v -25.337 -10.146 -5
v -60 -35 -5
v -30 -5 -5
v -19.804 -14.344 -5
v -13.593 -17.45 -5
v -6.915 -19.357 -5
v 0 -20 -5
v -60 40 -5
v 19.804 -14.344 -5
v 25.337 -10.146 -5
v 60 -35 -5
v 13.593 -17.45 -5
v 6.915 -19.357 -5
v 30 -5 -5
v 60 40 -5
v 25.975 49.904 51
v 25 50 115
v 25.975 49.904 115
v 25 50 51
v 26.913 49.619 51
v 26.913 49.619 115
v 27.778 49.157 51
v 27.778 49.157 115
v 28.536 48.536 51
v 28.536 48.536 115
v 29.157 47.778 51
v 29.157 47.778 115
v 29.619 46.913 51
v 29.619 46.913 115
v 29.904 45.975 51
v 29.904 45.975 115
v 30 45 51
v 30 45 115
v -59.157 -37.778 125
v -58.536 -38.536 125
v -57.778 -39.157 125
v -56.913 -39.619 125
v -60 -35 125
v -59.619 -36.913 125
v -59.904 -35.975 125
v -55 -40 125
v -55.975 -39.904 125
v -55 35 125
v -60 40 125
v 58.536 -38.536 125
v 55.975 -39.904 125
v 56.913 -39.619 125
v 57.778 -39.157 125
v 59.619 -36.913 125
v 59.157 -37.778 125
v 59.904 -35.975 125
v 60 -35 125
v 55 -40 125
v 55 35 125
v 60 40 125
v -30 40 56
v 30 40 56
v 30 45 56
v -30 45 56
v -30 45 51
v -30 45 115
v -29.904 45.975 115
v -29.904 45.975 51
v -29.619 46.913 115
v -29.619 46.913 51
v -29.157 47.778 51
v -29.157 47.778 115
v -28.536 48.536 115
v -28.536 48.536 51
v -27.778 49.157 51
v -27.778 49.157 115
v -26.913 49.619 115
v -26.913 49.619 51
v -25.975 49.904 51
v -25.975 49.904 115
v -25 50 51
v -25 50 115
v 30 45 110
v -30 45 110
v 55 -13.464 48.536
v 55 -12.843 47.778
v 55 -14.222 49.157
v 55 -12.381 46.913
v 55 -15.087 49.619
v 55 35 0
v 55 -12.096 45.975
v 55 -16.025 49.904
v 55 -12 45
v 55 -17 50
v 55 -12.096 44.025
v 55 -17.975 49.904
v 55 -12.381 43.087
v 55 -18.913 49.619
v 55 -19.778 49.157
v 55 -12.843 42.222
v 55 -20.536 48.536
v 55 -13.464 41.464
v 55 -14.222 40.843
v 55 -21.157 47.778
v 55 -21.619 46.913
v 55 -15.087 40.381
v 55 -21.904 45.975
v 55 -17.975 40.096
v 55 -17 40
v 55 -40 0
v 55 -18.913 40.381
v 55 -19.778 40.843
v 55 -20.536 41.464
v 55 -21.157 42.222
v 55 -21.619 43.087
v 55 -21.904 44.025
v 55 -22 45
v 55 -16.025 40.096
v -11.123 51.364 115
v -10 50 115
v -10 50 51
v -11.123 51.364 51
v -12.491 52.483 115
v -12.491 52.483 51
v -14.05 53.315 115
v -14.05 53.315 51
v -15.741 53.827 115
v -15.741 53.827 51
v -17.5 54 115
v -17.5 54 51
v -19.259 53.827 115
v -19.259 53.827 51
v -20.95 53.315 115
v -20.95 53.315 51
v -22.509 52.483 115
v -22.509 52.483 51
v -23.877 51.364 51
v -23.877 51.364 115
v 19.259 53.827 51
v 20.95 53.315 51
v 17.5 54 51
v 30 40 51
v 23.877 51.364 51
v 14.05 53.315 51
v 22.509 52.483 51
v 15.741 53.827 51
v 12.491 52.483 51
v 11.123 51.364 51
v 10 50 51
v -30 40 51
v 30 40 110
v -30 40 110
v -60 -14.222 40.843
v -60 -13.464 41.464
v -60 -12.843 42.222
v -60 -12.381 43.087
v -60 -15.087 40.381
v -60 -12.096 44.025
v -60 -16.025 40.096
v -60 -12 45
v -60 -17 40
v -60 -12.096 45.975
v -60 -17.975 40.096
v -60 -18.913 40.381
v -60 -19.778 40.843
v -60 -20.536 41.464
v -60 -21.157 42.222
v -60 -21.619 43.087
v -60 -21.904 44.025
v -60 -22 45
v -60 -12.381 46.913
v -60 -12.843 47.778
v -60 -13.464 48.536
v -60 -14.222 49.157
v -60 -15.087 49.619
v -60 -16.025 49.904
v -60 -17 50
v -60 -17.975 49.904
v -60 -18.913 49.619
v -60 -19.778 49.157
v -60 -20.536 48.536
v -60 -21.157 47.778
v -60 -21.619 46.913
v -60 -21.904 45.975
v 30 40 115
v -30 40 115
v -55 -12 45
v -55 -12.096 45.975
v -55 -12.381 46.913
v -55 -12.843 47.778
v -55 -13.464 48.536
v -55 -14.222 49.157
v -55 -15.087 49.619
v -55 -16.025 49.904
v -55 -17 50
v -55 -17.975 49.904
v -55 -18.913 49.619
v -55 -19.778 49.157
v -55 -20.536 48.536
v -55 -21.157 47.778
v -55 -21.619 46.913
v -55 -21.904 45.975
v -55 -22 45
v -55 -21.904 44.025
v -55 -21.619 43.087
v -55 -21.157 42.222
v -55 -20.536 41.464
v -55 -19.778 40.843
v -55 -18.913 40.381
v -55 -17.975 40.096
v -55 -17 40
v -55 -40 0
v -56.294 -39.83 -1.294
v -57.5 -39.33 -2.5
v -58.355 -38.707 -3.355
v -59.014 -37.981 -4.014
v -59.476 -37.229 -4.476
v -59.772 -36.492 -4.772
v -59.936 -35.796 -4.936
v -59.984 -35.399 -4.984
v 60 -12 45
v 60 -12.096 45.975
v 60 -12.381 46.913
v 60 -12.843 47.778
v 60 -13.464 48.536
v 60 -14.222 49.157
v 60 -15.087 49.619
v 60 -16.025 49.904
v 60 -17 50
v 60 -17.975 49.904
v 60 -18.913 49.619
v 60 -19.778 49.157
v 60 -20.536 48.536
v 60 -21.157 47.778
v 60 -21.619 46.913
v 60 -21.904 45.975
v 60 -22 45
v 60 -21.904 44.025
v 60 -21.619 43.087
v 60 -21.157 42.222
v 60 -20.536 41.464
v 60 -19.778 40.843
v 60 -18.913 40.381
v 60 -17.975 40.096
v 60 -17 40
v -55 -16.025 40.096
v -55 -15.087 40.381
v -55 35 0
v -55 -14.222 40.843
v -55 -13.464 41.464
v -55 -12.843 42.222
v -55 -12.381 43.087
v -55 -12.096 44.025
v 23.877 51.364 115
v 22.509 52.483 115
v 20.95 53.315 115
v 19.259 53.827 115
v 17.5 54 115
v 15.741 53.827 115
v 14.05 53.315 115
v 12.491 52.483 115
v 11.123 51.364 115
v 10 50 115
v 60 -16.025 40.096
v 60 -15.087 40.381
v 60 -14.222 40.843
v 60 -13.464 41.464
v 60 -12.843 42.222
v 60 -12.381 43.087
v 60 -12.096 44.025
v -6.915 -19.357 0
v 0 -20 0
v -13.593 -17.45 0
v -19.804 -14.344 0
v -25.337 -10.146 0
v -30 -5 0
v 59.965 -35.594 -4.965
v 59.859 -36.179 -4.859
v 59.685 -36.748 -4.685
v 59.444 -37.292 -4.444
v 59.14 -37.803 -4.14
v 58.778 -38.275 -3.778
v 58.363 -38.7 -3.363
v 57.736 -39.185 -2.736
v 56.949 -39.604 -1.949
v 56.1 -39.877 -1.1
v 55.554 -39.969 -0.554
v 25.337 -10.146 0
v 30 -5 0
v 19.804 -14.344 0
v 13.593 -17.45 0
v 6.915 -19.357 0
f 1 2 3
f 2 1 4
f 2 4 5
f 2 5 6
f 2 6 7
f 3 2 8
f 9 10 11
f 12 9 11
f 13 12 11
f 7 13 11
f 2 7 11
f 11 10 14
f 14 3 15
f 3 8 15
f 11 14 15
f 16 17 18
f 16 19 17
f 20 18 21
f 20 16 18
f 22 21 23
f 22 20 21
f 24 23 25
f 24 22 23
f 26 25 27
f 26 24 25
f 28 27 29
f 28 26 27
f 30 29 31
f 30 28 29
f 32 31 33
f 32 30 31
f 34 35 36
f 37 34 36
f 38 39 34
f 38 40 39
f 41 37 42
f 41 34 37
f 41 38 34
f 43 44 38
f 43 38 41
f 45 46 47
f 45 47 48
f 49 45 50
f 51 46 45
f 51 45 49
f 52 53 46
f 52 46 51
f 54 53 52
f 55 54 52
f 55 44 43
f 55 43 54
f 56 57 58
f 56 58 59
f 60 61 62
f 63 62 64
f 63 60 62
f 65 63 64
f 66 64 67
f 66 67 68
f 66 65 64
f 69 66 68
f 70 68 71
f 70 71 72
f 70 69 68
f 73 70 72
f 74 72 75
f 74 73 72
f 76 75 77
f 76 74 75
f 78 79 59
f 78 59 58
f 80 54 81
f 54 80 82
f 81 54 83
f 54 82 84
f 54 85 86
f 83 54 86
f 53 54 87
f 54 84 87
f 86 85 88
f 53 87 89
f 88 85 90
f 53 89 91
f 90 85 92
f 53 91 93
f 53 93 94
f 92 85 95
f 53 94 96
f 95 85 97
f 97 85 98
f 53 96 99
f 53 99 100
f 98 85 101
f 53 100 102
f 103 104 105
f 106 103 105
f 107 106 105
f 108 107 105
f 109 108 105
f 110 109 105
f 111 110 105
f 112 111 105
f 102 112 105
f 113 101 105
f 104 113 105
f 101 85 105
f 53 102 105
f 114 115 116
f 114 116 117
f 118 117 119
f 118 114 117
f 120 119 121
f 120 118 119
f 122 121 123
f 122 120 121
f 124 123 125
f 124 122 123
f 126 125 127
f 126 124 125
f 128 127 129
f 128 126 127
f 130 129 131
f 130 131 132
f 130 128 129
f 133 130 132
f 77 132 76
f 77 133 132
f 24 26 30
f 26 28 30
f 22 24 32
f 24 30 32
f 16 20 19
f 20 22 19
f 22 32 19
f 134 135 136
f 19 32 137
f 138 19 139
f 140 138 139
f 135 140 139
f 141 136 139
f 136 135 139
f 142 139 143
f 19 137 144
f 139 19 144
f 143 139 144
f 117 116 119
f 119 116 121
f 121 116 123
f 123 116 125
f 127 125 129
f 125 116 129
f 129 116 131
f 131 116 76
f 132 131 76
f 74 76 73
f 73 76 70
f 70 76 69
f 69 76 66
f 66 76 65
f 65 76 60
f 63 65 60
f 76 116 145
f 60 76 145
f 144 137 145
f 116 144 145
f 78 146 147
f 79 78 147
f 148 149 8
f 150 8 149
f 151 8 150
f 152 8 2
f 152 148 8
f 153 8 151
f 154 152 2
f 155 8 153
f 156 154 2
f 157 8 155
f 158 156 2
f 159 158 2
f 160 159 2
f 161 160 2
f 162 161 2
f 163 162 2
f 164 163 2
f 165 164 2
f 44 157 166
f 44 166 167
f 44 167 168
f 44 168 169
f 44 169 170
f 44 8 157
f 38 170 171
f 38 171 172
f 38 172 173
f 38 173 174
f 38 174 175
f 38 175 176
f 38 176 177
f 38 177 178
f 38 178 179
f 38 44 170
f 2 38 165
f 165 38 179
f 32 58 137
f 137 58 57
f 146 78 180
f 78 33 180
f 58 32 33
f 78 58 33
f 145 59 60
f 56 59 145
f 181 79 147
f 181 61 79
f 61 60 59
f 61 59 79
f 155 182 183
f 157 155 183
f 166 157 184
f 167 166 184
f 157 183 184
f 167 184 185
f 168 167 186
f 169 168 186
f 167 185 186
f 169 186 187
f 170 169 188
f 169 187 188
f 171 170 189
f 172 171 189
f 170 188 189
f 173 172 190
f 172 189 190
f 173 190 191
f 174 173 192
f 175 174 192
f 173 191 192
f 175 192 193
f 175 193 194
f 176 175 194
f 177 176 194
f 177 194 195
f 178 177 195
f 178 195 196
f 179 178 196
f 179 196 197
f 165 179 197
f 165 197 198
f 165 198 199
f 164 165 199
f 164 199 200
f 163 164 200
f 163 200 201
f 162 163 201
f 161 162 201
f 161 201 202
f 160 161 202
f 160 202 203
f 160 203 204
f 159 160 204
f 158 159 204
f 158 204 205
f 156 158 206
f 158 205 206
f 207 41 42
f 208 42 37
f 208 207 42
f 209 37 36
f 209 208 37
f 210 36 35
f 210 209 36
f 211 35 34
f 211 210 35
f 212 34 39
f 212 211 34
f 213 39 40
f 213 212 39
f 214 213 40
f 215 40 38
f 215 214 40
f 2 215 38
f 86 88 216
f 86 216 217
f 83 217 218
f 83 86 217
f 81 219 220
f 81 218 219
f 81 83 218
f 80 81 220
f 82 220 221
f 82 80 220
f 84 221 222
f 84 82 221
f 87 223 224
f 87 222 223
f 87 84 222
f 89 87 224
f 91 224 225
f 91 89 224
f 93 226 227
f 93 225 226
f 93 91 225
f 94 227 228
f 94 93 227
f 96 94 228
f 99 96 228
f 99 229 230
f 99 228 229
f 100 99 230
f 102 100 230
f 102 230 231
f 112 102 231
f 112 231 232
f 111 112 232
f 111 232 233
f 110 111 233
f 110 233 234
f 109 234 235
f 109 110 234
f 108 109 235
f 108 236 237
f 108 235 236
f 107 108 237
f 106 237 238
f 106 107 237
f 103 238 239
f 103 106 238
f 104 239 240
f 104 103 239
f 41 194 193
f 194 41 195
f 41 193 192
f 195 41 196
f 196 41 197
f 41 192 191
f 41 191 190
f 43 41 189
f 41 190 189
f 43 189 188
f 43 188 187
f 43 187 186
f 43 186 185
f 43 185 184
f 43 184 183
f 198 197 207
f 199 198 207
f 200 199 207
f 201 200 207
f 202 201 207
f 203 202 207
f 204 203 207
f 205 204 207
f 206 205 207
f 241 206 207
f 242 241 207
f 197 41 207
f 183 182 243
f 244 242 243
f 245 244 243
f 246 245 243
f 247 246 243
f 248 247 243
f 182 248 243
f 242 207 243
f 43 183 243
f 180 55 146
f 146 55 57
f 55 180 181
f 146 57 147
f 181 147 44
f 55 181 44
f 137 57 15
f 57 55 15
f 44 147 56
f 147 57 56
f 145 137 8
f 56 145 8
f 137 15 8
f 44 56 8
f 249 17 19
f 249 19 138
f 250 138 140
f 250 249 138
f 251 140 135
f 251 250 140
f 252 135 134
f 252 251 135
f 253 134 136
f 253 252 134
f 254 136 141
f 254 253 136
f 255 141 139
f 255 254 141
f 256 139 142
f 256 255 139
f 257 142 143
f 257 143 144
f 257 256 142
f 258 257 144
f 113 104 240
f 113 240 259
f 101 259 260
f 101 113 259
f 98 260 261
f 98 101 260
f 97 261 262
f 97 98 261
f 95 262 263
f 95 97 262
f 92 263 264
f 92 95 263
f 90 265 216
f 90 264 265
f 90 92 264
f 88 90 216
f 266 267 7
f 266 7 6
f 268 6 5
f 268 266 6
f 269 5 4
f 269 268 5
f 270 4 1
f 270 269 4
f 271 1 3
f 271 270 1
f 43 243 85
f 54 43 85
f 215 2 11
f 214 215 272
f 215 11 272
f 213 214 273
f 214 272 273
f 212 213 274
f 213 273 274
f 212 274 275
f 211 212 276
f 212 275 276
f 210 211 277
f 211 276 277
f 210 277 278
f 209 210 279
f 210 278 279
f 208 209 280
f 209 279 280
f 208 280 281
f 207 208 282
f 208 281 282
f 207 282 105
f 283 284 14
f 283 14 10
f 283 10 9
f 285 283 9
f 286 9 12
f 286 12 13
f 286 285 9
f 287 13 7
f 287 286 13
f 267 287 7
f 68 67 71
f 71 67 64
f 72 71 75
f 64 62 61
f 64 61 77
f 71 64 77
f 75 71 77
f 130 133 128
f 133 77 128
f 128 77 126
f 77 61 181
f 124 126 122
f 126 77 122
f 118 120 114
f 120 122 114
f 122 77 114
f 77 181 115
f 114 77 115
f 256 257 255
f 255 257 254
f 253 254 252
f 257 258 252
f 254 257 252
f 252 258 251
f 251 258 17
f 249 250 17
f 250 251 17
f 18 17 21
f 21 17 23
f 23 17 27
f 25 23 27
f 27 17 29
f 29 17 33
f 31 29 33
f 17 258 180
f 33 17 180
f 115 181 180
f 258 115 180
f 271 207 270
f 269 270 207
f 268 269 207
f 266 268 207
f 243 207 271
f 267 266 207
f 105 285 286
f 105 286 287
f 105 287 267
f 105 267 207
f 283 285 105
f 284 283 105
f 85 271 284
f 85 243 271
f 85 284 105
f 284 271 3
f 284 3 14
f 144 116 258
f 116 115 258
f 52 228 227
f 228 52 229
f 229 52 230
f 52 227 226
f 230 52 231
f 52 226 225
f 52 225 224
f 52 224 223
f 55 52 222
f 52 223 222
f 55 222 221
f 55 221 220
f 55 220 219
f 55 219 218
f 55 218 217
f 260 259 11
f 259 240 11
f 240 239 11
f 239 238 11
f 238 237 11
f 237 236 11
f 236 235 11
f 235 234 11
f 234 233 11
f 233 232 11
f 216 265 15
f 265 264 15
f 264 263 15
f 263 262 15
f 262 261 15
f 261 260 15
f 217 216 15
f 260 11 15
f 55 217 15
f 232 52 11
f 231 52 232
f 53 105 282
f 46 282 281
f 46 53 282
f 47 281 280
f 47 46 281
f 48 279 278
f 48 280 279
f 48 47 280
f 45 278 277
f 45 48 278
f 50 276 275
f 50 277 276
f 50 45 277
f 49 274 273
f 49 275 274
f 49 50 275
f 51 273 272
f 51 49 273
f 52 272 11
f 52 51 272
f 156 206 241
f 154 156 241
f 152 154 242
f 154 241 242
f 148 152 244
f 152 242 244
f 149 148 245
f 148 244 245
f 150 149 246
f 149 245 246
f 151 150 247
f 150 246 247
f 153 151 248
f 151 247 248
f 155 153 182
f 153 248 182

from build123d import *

# Parameters (mm, degrees)
F1_DEPTH      = 5
F2_DEPTH      = 125
F4_DEPTH      = 25
F4_DEPTH_BACK = 129
F5_W          = 60
F5_H          = 5
F6_DEPTH      = 10
F7_W          = 60
F7_H          = 5
F8_DEPTH      = 54
F9_R          = 4.99999
F11_DEPTH     = 64


# Not quite as in the source:
# - a fillet or chamfer is up to 0.001 mm smaller than in the source, because OpenCascade refuses the exact size
# - ends of sketch curves that miss each other by under 0.0002 mm in the source are joined


with BuildPart() as f1:
    # F0 (on Top) → F1 (new body)
    with BuildSketch(Plane.XY):
        Polygon((55, -40), (60, -40), (60, 40), (-60, 40), (-60, -40), (-55, -40), (-55, 35), (0, 35), (55, 35), align=None)
        with BuildLine():
            Line((-55, -40), (0, -40))
            Line((0, -40), (0, -20))
            ThreePointArc((0, -20), (-16.7705098312, -16.0410196625), (-30, -5))
            Line((-30, -5), (0, -5))
            Line((0, -5), (0, 35))
            Line((0, 35), (-55, 35))
            Line((-55, 35), (-55, -40))
        make_face()
        with BuildLine():
            Line((0, -40), (55, -40))
            Line((55, -40), (55, 35))
            Line((55, 35), (0, 35))
            Line((0, 35), (0, -5))
            Line((0, -5), (30, -5))
            ThreePointArc((30, -5), (16.7705098312, -16.0410196625), (0, -20))
            Line((0, -20), (0, -40))
        make_face()
    extrude(amount=-F1_DEPTH)

    # F0 (on Top) → F2 (join)
    with BuildSketch(Plane.XY):
        Polygon((55, -40), (60, -40), (60, 40), (-60, 40), (-60, -40), (-55, -40), (-55, 35), (0, 35), (55, 35), align=None)
    extrude(amount=F2_DEPTH)

    # F3 (on face) → F4 (cut, two sides)
    with BuildSketch(Plane.YZ.offset(-55)) as f4_sk:
        with BuildLine():
            Line((-17, 45), (-17, 40))
            ThreePointArc((-17, 40), (-13.4644660941, 41.4644660941), (-12, 45))
            Line((-12, 45), (-17, 45))
        make_face()
        with BuildLine():
            ThreePointArc((-12, 45), (-20.5355339059, 48.5355339059), (-17, 40))
            Line((-17, 40), (-17, 45))
            Line((-17, 45), (-12, 45))
        make_face()
    extrude(amount=-F4_DEPTH, mode=Mode.SUBTRACT)
    extrude(f4_sk.sketch, amount=F4_DEPTH_BACK, mode=Mode.SUBTRACT)

    # F5 (on face) → F6 (join)
    with BuildSketch(Plane(origin=(0, 40, 0), x_dir=(-1, 0, 0), z_dir=(0, 1, 0))):
        Polygon((30, 115), (0, 115), (-30, 115), (-30, 110), (30, 110), align=None)
        with Locations((0, 53.5)):
            Rectangle(F5_W, F5_H)
    extrude(amount=F6_DEPTH)

    # F7 (on face) → F8 (join, through all)
    with BuildSketch(Plane(origin=(0, 0, 110), x_dir=(1, 0, 0), z_dir=(0, 0, -1))):
        with Locations((0, -47.5)):
            Rectangle(F7_W, F7_H)
    extrude(amount=F8_DEPTH)

    # F9 (radius 5 in the source; OpenCascade refuses exactly that, so slightly less here)
    f9_edges = [f1.edges().sort_by_distance(p)[0] for p in [
        (-60, -40, 60),
        (0, -40, -5),
        (60, -40, 60),
        (-30, 50, 83),
        (30, 50, 83),
    ]]
    fillet(f9_edges, radius=F9_R)

    # F10 (on face) → F11 (join, through all)
    with BuildSketch(Plane.XY.offset(115)):
        with BuildLine():
            ThreePointArc((-17.5, 54), (-21.75, 52.9375), (-25, 50))
            Line((-25, 50), (-17.5, 50))
            Line((-17.5, 50), (-17.5, 54))
        make_face()
        with BuildLine():
            Line((-17.5, 54), (-17.5, 50))
            Line((-17.5, 50), (-10, 50))
            ThreePointArc((-10, 50), (-13.25, 52.9375), (-17.5, 54))
        make_face()
        with BuildLine():
            ThreePointArc((25, 50), (17.5, 54), (10, 50))
            Line((10, 50), (25, 50))
        make_face()
    extrude(amount=-F11_DEPTH)


solid = f1.part
